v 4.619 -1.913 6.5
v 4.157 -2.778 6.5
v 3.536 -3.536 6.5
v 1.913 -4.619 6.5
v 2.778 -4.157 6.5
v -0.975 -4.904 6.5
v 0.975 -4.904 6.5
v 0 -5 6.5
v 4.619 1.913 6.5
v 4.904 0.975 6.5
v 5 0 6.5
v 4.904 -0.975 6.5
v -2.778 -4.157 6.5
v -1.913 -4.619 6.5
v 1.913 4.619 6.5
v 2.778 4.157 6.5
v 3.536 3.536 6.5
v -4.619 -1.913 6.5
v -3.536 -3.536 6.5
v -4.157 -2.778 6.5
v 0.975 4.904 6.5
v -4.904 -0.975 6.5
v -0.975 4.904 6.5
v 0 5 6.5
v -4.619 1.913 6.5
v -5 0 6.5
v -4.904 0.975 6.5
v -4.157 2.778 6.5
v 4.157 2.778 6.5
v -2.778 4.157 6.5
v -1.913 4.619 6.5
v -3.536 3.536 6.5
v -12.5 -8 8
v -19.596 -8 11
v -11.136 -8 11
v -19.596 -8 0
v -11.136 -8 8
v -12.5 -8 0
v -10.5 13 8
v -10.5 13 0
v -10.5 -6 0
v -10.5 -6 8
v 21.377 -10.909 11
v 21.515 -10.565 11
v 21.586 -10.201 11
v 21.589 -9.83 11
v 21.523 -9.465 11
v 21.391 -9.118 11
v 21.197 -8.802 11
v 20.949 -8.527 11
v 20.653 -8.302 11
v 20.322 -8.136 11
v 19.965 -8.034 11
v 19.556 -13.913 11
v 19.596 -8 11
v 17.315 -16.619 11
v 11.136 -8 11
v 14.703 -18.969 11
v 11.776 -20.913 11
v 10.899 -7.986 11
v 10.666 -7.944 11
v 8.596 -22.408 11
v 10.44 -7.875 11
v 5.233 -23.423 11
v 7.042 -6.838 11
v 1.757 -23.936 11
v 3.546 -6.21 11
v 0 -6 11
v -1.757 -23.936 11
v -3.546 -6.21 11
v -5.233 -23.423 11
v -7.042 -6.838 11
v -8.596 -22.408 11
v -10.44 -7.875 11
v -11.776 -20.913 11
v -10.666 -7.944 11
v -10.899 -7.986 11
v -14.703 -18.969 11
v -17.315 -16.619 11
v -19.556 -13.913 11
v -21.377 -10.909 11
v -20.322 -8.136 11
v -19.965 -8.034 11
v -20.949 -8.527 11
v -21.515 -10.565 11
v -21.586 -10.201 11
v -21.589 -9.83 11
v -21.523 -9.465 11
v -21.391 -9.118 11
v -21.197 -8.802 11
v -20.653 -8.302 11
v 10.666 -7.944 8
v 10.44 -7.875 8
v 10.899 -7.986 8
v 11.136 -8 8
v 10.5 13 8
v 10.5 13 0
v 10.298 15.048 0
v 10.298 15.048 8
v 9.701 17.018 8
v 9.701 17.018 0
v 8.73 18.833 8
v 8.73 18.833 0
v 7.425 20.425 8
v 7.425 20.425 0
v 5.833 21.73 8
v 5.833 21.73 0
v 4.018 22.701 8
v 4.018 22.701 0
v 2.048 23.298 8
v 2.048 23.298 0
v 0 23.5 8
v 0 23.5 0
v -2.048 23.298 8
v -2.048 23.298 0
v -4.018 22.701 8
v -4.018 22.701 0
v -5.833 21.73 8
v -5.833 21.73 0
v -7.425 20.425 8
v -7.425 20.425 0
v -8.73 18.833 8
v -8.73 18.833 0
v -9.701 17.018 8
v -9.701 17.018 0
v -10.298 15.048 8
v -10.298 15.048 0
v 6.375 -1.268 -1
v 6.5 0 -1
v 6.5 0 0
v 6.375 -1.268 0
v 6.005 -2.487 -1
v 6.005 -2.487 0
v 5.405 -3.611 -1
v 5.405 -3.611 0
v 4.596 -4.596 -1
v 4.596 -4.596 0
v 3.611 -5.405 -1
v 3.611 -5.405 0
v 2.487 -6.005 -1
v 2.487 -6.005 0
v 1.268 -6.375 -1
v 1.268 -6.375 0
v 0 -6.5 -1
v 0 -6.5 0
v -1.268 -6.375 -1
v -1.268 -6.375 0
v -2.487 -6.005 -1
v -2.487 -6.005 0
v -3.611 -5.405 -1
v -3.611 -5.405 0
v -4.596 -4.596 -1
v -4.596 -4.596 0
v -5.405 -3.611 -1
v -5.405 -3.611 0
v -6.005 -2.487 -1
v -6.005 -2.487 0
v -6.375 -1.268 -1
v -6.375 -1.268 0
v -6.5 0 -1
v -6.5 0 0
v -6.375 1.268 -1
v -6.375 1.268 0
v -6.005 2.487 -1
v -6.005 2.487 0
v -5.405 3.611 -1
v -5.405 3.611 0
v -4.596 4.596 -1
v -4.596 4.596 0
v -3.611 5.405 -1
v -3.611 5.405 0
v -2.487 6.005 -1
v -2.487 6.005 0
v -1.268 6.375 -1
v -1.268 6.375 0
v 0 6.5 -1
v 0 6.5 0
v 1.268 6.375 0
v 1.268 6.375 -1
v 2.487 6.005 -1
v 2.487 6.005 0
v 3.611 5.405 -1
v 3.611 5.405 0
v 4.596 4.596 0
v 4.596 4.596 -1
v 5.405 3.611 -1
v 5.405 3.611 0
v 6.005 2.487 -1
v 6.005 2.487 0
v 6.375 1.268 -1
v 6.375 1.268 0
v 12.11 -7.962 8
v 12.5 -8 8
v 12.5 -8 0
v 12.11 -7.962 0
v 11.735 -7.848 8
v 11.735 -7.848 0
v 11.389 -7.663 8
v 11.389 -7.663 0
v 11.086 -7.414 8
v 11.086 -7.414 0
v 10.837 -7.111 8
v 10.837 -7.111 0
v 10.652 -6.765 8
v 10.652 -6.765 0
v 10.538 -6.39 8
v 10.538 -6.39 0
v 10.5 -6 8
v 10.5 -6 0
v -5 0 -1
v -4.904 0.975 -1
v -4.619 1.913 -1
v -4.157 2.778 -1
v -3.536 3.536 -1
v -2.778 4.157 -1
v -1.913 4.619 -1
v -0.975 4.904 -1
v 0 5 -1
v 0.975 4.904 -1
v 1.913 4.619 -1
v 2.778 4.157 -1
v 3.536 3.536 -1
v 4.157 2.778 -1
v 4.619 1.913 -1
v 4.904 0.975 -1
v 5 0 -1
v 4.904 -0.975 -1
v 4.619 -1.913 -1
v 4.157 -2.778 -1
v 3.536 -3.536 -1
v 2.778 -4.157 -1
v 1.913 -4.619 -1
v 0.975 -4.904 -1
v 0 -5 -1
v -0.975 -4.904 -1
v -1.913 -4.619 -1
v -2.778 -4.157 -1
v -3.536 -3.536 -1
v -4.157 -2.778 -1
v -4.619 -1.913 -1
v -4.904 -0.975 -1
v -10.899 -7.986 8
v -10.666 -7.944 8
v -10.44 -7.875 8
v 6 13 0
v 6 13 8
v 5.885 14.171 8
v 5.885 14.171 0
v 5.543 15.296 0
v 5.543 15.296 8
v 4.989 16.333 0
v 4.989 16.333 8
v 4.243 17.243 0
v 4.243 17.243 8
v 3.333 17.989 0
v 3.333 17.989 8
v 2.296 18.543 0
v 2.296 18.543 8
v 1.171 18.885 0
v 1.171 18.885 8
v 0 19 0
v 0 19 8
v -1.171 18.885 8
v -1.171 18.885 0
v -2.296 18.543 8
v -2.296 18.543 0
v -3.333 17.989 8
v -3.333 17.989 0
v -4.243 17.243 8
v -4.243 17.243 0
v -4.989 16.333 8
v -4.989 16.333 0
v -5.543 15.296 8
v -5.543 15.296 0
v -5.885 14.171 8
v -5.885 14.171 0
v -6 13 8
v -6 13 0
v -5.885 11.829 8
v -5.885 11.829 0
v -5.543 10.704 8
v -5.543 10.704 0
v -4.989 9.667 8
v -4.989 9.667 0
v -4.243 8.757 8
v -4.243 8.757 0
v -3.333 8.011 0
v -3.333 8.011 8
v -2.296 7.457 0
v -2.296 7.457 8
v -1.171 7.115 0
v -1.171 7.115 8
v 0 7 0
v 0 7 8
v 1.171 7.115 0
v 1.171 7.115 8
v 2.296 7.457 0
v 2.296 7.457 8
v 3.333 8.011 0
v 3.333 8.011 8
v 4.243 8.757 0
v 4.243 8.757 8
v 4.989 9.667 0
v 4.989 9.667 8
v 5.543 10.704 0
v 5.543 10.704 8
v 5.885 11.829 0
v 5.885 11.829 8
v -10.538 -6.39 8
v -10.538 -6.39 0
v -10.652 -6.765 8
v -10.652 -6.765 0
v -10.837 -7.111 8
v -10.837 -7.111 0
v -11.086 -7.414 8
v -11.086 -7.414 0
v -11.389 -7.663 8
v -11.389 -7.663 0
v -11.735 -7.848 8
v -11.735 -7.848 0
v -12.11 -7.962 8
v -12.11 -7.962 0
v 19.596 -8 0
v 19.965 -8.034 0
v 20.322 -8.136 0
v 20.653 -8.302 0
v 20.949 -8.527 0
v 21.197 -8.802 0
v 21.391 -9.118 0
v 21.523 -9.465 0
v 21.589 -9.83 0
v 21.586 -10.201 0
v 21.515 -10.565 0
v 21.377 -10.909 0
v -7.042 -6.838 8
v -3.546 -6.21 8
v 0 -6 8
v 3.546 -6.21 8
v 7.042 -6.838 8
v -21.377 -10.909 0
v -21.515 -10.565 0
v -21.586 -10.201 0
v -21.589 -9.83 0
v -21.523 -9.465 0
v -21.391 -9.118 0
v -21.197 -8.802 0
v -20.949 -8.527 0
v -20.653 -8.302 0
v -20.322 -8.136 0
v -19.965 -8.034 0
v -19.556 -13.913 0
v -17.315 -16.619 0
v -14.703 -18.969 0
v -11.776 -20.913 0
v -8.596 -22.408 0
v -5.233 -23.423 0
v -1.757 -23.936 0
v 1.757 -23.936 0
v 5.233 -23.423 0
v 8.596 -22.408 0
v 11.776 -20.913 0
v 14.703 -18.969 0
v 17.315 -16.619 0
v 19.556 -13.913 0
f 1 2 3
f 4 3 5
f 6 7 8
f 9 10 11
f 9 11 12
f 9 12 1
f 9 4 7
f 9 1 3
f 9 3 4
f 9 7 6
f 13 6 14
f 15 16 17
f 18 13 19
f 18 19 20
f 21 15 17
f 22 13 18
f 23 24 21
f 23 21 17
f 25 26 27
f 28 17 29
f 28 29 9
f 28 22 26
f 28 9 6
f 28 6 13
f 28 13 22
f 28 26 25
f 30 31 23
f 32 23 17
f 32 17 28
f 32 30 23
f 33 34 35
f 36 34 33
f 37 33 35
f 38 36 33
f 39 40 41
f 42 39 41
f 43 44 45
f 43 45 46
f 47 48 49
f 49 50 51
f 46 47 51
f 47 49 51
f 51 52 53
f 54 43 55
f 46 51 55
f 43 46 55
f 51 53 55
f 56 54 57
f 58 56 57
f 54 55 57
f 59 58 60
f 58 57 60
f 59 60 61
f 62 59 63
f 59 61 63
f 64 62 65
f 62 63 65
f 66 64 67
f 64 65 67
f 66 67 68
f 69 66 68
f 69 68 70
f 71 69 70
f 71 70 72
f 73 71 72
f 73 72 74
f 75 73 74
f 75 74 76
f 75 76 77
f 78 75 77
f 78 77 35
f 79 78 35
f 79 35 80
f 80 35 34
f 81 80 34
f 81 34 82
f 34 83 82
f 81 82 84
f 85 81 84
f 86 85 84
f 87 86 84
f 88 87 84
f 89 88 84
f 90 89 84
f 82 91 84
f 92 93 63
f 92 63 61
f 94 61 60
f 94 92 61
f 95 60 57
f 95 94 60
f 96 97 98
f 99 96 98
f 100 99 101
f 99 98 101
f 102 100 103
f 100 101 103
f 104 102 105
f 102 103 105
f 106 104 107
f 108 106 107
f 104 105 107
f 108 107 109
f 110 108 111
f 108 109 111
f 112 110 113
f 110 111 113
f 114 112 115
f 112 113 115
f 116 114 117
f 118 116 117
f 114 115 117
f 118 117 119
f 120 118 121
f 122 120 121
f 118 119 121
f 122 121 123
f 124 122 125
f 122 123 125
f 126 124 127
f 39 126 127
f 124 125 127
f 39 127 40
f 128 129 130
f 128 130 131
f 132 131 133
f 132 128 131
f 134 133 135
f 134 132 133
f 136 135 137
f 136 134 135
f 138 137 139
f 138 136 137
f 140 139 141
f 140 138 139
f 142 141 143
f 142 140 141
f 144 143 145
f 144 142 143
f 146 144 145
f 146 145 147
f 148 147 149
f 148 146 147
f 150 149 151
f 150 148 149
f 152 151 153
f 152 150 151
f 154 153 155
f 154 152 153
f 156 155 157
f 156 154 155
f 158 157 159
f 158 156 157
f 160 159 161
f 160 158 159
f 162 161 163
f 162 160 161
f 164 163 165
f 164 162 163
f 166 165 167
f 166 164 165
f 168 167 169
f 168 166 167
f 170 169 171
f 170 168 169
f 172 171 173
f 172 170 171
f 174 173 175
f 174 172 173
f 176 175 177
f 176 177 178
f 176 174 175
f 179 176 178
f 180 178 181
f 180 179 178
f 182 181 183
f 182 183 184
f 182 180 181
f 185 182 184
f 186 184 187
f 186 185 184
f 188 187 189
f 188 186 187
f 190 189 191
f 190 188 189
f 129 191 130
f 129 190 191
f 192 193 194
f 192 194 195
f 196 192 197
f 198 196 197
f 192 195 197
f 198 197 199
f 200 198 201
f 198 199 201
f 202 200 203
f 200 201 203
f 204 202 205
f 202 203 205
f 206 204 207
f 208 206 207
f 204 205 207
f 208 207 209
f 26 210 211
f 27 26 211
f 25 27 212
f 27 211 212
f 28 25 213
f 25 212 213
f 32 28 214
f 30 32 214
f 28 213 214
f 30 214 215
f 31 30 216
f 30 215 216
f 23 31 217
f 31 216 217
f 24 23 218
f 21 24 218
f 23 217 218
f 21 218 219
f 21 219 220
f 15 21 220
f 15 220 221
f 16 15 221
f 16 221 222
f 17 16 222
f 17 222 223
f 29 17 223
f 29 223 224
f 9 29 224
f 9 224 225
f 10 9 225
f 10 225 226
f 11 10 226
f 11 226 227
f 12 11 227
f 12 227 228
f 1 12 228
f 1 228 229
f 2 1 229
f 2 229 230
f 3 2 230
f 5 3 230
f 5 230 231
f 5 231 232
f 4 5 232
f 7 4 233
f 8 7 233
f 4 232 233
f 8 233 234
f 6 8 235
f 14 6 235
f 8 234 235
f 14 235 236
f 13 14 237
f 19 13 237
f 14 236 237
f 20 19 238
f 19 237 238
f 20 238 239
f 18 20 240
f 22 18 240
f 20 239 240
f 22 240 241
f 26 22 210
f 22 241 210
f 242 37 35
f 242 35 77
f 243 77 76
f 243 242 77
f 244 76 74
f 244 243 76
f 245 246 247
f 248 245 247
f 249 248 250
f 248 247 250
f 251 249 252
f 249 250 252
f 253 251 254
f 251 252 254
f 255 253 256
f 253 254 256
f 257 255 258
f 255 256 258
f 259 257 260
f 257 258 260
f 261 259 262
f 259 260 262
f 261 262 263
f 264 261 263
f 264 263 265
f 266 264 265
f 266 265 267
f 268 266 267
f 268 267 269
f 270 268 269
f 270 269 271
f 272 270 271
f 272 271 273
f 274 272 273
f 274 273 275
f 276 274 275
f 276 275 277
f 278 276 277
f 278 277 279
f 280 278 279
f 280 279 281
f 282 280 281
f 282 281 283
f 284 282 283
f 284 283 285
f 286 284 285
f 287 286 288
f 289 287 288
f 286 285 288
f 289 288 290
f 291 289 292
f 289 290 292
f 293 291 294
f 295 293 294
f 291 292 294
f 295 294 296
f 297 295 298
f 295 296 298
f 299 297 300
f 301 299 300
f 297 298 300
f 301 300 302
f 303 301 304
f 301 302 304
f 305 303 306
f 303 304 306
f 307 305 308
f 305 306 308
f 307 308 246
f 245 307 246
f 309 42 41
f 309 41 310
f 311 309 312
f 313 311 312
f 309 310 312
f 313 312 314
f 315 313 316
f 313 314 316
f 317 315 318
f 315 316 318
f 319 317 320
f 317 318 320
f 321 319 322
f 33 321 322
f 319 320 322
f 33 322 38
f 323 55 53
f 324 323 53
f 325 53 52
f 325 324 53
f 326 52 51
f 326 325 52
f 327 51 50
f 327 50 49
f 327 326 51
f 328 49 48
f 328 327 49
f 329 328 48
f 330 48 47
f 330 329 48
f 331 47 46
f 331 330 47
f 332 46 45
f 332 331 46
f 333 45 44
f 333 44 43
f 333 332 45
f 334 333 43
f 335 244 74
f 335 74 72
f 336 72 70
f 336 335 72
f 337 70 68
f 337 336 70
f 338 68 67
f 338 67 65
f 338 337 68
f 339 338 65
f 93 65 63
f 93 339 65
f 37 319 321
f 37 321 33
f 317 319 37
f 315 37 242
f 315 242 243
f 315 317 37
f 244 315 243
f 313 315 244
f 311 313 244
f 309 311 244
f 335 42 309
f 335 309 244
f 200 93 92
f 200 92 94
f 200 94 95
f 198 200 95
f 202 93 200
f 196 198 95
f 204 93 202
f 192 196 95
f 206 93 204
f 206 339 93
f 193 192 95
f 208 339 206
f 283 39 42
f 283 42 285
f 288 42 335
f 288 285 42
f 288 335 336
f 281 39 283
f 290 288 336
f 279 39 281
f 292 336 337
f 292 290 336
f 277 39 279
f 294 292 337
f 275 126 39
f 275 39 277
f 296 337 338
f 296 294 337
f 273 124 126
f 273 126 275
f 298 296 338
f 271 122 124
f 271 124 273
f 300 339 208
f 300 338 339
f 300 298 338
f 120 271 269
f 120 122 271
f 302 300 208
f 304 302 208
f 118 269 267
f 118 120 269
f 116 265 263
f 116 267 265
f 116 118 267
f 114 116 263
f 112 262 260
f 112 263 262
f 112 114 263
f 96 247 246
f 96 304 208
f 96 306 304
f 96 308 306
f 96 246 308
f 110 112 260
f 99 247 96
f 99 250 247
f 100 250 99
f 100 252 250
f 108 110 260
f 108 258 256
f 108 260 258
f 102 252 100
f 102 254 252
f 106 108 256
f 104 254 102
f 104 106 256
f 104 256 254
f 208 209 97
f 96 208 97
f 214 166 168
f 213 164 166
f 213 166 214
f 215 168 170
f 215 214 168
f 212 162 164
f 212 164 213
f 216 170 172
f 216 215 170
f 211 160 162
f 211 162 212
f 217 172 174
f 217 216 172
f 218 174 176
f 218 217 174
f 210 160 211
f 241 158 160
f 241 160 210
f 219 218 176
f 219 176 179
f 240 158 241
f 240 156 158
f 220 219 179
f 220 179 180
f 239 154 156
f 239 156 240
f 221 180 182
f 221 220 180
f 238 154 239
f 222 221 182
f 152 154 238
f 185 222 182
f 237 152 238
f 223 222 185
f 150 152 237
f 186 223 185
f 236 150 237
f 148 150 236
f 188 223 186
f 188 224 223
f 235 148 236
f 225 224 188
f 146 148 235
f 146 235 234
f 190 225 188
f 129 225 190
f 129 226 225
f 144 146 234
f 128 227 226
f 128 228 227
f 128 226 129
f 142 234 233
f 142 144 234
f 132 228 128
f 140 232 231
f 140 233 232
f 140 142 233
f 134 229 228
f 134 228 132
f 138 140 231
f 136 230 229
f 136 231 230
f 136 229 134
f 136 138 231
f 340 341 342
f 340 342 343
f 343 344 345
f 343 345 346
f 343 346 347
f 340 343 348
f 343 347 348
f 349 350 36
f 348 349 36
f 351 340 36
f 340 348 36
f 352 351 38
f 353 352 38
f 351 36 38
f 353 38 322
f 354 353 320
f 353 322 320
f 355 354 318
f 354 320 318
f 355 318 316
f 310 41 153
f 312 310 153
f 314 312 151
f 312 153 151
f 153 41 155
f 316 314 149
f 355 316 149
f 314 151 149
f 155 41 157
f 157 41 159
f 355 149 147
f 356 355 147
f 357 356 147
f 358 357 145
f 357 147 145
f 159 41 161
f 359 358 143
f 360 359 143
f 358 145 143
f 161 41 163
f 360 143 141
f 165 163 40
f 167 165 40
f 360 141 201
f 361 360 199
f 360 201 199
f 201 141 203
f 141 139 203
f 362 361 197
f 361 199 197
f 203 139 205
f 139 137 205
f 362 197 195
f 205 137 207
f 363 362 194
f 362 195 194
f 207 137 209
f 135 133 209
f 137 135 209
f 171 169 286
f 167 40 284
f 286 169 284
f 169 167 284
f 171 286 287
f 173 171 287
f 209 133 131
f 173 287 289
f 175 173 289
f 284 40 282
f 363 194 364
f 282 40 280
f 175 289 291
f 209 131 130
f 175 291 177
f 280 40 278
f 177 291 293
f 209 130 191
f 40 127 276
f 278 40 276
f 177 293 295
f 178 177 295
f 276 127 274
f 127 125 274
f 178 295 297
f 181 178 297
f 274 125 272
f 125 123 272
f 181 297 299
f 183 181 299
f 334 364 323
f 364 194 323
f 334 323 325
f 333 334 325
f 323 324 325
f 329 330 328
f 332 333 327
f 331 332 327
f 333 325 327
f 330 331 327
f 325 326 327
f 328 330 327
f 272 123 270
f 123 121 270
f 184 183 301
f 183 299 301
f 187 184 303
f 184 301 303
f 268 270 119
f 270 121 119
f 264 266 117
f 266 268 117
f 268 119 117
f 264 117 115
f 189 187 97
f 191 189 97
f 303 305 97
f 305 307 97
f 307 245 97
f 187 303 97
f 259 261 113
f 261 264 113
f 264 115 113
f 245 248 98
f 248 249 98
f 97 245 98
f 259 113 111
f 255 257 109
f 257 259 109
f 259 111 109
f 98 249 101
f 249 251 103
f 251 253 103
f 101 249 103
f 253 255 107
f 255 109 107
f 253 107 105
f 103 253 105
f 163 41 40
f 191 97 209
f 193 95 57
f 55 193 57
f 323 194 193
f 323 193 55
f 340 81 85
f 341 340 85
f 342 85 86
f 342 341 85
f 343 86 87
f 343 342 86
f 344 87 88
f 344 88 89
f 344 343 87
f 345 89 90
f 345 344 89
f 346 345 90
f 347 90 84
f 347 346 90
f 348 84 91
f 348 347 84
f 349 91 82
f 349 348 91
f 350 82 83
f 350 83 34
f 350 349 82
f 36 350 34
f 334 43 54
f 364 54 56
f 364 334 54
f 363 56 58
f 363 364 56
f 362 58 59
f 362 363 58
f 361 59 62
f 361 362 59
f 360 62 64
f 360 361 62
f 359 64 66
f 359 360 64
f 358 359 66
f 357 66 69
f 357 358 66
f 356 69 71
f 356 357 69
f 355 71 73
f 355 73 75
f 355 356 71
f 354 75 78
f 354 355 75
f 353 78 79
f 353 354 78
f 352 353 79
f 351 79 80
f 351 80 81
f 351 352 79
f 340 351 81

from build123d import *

# Parameters (mm, degrees)
BASE_EXTRUSION_DEPTH    = 8
BOSS_EXTRU_1_DEPTH      = 3
ESQUISSE4_R             = 6
ENL_V_MAT_EXTRU_1_DEPTH = 34.262346156
ESQUISSE5_R             = 5
ENL_V_MAT_EXTRU_2_DEPTH = 6.5
BOSS_EXTRU_2_START      = 1
ESQUISSE6_R             = 6.5
ESQUISSE6_R_2           = 5
BOSS_EXTRU_2_DEPTH      = 1


with BuildPart() as part:
    # Esquisse1 → Base-Extrusion (new body)
    with BuildSketch(Plane.XY):
        with BuildLine():
            Line((-10.5, 13), (-10.5, -6))
            ThreePointArc((-10.5, -6), (-11.085786438, -7.414213562), (-12.5, -8))
            Line((-12.5, -8), (-19.595917942, -8))
            ThreePointArc((-19.595917942, -8), (-21.301523673, -8.955534064), (-21.377365028, -10.909090909))
            ThreePointArc((-21.377365028, -10.909090909), (0, -24), (21.377365028, -10.909090909))
            ThreePointArc((21.377365028, -10.909090909), (21.301523673, -8.955534064), (19.595917942, -8))
            Line((19.595917942, -8), (12.5, -8))
            ThreePointArc((12.5, -8), (11.085786438, -7.414213562), (10.5, -6))
            Line((10.5, -6), (10.5, 13))
            ThreePointArc((10.5, 13), (0, 23.5), (-10.5, 13))
        make_face()
    extrude(amount=BASE_EXTRUSION_DEPTH)

    # Esquisse2 → Boss.-Extru.1 (add)
    with BuildSketch(Plane.XY.offset(8)):
        with BuildLine():
            Line((-19.595917942, -8), (-11.135528726, -8))
            ThreePointArc((-11.135528726, -8), (-10.781975335, -7.968501969), (-10.43955818, -7.875))
            ThreePointArc((-10.43955818, -7.875), (0, -6), (10.43955818, -7.875))
            ThreePointArc((10.43955818, -7.875), (10.781975335, -7.968501969), (11.135528726, -8))
            Line((11.135528726, -8), (19.595917942, -8))
            ThreePointArc((19.595917942, -8), (21.301523673, -8.955534064), (21.377365028, -10.909090909))
            ThreePointArc((21.377365028, -10.909090909), (0, -24), (-21.377365028, -10.909090909))
            ThreePointArc((-21.377365028, -10.909090909), (-21.301523673, -8.955534064), (-19.595917942, -8))
        make_face()
    extrude(amount=BOSS_EXTRU_1_DEPTH)

    # Esquisse4 → Enlèv. mat.-Extru.1 (cut, through all)
    with BuildSketch(Plane.XY.offset(8)):
        with Locations((0, 13)):
            Circle(ESQUISSE4_R)
    extrude(amount=-ENL_V_MAT_EXTRU_1_DEPTH, mode=Mode.SUBTRACT)

    # Esquisse5 → Enlèv. mat.-Extru.2 (cut)
    with BuildSketch(Plane(origin=(0, 0, 0), x_dir=(-1, 0, 0), z_dir=(0, 0, -1))):
        Circle(ESQUISSE5_R)
    extrude(amount=-ENL_V_MAT_EXTRU_2_DEPTH, mode=Mode.SUBTRACT)

    # Esquisse6 → Boss.-Extru.2 (add)
    with BuildSketch(Plane(origin=(0, 0, 0), x_dir=(-1, 0, 0), z_dir=(0, 0, -1)).offset(BOSS_EXTRU_2_START)):
        with Locations(Location((0, 0, 0), (0, 0, 180))):
            Circle(ESQUISSE6_R)
        Circle(ESQUISSE6_R_2, mode=Mode.SUBTRACT)
    extrude(amount=-BOSS_EXTRU_2_DEPTH)


solid = part.part
